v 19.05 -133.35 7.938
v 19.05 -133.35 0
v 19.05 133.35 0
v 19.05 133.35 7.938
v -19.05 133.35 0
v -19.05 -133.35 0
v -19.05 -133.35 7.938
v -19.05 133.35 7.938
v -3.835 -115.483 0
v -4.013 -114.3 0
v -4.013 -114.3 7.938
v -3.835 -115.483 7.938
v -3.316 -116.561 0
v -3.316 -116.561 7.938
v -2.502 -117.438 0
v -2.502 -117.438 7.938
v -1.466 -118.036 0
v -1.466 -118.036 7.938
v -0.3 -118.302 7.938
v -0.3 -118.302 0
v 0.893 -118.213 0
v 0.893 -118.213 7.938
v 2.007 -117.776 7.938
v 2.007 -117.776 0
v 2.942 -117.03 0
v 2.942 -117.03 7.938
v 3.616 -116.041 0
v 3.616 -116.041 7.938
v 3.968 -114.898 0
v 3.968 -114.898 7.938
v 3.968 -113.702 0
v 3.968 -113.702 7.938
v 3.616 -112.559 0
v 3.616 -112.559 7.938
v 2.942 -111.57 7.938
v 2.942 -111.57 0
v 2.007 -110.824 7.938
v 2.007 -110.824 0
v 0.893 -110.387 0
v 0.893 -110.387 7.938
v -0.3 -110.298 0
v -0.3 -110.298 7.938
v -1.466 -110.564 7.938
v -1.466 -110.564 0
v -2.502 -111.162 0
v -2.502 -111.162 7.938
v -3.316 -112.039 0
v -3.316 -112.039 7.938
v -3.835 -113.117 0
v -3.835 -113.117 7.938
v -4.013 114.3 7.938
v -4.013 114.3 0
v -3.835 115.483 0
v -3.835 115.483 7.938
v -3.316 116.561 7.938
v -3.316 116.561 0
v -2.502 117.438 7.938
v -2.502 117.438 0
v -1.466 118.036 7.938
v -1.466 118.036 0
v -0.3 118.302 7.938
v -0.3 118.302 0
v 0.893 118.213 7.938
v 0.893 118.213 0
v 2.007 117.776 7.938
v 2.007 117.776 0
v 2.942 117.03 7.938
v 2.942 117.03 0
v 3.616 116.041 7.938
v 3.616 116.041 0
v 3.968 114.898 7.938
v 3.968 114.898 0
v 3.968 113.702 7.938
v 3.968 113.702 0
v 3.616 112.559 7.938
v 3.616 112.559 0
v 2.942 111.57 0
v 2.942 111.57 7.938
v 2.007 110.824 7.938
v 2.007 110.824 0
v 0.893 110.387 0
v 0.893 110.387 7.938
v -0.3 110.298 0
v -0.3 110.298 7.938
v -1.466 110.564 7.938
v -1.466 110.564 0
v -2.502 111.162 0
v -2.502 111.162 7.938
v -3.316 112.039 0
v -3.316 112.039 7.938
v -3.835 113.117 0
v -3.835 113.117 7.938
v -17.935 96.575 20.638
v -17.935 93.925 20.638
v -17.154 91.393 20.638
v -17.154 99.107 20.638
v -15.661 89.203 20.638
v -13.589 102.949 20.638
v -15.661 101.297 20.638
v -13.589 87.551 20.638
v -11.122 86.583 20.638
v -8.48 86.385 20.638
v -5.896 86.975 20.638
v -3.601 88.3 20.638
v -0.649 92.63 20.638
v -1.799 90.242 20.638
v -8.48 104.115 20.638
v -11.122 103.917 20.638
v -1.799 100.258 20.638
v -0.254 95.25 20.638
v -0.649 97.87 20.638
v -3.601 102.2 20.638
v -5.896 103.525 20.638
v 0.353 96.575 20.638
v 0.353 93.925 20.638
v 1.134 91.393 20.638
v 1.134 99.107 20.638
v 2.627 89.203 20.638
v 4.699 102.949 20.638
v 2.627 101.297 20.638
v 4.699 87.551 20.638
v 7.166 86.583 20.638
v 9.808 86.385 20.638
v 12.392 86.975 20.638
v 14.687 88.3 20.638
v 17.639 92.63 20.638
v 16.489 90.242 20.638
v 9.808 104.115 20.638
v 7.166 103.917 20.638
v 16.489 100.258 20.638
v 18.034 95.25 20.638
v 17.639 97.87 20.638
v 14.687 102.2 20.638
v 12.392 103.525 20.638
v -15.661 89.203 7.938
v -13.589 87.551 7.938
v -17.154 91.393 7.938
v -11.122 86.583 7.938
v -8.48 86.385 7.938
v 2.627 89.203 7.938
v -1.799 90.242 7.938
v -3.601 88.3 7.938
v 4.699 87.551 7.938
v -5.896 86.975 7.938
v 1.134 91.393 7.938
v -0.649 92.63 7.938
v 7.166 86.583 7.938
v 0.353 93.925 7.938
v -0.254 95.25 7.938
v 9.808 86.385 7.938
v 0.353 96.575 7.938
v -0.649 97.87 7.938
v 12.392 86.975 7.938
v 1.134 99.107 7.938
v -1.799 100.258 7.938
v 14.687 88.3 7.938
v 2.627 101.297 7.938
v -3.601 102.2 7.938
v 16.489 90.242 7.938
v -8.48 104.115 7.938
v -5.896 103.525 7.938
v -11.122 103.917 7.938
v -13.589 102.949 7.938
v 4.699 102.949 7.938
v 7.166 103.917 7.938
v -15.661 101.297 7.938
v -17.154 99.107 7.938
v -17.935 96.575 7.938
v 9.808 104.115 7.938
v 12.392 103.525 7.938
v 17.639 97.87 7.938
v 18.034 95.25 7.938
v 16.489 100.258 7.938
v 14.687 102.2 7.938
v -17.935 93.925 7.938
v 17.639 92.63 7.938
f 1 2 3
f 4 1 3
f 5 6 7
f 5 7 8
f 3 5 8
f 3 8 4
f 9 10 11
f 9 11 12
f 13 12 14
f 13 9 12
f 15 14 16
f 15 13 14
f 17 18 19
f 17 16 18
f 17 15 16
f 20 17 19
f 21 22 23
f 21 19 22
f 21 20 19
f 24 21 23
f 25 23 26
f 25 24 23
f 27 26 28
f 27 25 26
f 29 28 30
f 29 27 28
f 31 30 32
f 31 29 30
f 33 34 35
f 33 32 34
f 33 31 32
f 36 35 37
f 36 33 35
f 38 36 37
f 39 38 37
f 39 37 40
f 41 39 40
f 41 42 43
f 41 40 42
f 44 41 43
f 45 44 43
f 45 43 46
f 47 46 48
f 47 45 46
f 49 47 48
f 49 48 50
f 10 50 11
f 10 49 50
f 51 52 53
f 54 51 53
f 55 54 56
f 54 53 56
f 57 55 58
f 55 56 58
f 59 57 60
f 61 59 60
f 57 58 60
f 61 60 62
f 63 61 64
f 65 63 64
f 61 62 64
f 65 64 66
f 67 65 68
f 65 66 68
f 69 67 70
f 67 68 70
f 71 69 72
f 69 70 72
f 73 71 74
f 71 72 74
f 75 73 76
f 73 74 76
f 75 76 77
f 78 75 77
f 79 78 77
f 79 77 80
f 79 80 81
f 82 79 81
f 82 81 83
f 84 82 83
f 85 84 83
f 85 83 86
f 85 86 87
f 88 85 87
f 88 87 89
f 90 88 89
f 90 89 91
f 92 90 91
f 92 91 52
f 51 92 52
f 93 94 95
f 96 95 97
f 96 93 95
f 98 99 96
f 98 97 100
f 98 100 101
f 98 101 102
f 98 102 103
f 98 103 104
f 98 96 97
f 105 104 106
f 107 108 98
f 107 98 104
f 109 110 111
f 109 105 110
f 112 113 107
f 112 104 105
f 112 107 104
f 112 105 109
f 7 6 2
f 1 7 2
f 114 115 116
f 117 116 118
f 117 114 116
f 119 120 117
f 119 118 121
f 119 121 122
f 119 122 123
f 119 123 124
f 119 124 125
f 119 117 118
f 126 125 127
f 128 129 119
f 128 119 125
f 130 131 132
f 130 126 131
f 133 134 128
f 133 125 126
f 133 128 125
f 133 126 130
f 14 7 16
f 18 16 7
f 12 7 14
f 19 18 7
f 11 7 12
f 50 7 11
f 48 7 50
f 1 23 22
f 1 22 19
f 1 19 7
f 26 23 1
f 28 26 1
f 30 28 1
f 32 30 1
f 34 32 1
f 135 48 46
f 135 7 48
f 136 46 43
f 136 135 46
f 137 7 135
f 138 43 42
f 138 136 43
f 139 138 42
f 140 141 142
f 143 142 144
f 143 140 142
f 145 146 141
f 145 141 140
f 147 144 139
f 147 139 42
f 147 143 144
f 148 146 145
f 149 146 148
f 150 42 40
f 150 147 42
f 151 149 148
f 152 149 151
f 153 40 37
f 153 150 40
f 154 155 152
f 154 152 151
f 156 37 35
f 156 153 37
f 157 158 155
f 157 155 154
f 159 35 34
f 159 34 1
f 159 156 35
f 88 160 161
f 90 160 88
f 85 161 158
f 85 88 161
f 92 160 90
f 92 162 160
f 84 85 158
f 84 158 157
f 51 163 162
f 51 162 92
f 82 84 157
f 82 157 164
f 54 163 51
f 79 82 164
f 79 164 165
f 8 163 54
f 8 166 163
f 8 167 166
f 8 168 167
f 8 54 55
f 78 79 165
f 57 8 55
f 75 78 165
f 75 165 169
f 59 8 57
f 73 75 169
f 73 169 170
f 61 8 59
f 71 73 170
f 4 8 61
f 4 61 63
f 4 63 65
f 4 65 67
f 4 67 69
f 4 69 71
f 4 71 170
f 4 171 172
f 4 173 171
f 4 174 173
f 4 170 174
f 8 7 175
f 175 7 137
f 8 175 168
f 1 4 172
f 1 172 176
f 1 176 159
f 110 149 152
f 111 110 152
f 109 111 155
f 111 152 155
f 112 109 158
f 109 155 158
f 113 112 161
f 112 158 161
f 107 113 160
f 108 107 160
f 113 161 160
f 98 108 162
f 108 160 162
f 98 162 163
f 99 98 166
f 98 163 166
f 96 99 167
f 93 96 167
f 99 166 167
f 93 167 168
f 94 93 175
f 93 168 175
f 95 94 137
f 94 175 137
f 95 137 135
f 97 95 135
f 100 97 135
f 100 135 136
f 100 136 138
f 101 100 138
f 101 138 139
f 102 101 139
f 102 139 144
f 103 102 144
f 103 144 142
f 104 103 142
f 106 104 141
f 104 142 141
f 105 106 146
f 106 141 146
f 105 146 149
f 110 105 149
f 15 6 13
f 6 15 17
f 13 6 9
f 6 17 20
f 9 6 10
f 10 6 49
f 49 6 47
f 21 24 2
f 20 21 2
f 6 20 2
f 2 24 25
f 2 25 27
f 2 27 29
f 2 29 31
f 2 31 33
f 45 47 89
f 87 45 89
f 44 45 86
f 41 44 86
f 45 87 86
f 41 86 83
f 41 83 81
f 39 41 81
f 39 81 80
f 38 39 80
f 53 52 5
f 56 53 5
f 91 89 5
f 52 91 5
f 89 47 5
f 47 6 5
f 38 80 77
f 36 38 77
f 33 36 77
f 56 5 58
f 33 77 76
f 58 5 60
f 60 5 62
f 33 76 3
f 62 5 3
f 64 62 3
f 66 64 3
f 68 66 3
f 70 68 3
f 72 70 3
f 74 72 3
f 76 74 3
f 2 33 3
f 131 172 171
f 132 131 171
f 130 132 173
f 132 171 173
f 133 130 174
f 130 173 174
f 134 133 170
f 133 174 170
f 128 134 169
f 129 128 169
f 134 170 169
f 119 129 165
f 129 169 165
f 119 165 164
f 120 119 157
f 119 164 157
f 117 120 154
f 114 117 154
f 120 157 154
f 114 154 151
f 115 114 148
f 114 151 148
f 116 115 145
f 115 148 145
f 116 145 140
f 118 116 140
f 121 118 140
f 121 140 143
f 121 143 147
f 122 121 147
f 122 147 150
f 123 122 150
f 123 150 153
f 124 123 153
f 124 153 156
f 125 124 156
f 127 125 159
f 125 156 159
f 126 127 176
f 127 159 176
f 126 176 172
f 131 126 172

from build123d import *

# Parameters (mm, degrees)
SKETCH1_W                = 38.1
SKETCH1_H                = 266.7
BOSS_EXTRUDE1_DEPTH      = 7.9375
O_0_316_DIAMETER_HOLE1_D = 8.0264
SKETCH4_R                = 8.89
BOSS_EXTRUDE2_DEPTH      = 12.7


with BuildPart() as part:
    # Sketch1 → Boss-Extrude1 (new body)
    with BuildSketch(Plane.XY):
        Rectangle(SKETCH1_W, SKETCH1_H)
    extrude(amount=BOSS_EXTRUDE1_DEPTH)

    # O (0.316) Diameter Hole1 (through all)
    with Locations(Plane.XY.offset(7.9375)):
        with Locations((0, 114.3)):
            o_0_316_diameter_hole1 = Hole(O_0_316_DIAMETER_HOLE1_D / 2)

    # Mirror1: O (0.316) Diameter Hole1 across plane
    add(o_0_316_diameter_hole1.mirror(Plane.ZX), mode=Mode.SUBTRACT)

    # Sketch4 → Boss-Extrude2 (add)
    with BuildSketch(Plane.XY.offset(7.9375)):
        with Locations((-9.144, 95.25)):
            Circle(SKETCH4_R)
        with Locations((9.144, 95.25)):
            Circle(SKETCH4_R)
    extrude(amount=BOSS_EXTRUDE2_DEPTH)


solid = part.part
